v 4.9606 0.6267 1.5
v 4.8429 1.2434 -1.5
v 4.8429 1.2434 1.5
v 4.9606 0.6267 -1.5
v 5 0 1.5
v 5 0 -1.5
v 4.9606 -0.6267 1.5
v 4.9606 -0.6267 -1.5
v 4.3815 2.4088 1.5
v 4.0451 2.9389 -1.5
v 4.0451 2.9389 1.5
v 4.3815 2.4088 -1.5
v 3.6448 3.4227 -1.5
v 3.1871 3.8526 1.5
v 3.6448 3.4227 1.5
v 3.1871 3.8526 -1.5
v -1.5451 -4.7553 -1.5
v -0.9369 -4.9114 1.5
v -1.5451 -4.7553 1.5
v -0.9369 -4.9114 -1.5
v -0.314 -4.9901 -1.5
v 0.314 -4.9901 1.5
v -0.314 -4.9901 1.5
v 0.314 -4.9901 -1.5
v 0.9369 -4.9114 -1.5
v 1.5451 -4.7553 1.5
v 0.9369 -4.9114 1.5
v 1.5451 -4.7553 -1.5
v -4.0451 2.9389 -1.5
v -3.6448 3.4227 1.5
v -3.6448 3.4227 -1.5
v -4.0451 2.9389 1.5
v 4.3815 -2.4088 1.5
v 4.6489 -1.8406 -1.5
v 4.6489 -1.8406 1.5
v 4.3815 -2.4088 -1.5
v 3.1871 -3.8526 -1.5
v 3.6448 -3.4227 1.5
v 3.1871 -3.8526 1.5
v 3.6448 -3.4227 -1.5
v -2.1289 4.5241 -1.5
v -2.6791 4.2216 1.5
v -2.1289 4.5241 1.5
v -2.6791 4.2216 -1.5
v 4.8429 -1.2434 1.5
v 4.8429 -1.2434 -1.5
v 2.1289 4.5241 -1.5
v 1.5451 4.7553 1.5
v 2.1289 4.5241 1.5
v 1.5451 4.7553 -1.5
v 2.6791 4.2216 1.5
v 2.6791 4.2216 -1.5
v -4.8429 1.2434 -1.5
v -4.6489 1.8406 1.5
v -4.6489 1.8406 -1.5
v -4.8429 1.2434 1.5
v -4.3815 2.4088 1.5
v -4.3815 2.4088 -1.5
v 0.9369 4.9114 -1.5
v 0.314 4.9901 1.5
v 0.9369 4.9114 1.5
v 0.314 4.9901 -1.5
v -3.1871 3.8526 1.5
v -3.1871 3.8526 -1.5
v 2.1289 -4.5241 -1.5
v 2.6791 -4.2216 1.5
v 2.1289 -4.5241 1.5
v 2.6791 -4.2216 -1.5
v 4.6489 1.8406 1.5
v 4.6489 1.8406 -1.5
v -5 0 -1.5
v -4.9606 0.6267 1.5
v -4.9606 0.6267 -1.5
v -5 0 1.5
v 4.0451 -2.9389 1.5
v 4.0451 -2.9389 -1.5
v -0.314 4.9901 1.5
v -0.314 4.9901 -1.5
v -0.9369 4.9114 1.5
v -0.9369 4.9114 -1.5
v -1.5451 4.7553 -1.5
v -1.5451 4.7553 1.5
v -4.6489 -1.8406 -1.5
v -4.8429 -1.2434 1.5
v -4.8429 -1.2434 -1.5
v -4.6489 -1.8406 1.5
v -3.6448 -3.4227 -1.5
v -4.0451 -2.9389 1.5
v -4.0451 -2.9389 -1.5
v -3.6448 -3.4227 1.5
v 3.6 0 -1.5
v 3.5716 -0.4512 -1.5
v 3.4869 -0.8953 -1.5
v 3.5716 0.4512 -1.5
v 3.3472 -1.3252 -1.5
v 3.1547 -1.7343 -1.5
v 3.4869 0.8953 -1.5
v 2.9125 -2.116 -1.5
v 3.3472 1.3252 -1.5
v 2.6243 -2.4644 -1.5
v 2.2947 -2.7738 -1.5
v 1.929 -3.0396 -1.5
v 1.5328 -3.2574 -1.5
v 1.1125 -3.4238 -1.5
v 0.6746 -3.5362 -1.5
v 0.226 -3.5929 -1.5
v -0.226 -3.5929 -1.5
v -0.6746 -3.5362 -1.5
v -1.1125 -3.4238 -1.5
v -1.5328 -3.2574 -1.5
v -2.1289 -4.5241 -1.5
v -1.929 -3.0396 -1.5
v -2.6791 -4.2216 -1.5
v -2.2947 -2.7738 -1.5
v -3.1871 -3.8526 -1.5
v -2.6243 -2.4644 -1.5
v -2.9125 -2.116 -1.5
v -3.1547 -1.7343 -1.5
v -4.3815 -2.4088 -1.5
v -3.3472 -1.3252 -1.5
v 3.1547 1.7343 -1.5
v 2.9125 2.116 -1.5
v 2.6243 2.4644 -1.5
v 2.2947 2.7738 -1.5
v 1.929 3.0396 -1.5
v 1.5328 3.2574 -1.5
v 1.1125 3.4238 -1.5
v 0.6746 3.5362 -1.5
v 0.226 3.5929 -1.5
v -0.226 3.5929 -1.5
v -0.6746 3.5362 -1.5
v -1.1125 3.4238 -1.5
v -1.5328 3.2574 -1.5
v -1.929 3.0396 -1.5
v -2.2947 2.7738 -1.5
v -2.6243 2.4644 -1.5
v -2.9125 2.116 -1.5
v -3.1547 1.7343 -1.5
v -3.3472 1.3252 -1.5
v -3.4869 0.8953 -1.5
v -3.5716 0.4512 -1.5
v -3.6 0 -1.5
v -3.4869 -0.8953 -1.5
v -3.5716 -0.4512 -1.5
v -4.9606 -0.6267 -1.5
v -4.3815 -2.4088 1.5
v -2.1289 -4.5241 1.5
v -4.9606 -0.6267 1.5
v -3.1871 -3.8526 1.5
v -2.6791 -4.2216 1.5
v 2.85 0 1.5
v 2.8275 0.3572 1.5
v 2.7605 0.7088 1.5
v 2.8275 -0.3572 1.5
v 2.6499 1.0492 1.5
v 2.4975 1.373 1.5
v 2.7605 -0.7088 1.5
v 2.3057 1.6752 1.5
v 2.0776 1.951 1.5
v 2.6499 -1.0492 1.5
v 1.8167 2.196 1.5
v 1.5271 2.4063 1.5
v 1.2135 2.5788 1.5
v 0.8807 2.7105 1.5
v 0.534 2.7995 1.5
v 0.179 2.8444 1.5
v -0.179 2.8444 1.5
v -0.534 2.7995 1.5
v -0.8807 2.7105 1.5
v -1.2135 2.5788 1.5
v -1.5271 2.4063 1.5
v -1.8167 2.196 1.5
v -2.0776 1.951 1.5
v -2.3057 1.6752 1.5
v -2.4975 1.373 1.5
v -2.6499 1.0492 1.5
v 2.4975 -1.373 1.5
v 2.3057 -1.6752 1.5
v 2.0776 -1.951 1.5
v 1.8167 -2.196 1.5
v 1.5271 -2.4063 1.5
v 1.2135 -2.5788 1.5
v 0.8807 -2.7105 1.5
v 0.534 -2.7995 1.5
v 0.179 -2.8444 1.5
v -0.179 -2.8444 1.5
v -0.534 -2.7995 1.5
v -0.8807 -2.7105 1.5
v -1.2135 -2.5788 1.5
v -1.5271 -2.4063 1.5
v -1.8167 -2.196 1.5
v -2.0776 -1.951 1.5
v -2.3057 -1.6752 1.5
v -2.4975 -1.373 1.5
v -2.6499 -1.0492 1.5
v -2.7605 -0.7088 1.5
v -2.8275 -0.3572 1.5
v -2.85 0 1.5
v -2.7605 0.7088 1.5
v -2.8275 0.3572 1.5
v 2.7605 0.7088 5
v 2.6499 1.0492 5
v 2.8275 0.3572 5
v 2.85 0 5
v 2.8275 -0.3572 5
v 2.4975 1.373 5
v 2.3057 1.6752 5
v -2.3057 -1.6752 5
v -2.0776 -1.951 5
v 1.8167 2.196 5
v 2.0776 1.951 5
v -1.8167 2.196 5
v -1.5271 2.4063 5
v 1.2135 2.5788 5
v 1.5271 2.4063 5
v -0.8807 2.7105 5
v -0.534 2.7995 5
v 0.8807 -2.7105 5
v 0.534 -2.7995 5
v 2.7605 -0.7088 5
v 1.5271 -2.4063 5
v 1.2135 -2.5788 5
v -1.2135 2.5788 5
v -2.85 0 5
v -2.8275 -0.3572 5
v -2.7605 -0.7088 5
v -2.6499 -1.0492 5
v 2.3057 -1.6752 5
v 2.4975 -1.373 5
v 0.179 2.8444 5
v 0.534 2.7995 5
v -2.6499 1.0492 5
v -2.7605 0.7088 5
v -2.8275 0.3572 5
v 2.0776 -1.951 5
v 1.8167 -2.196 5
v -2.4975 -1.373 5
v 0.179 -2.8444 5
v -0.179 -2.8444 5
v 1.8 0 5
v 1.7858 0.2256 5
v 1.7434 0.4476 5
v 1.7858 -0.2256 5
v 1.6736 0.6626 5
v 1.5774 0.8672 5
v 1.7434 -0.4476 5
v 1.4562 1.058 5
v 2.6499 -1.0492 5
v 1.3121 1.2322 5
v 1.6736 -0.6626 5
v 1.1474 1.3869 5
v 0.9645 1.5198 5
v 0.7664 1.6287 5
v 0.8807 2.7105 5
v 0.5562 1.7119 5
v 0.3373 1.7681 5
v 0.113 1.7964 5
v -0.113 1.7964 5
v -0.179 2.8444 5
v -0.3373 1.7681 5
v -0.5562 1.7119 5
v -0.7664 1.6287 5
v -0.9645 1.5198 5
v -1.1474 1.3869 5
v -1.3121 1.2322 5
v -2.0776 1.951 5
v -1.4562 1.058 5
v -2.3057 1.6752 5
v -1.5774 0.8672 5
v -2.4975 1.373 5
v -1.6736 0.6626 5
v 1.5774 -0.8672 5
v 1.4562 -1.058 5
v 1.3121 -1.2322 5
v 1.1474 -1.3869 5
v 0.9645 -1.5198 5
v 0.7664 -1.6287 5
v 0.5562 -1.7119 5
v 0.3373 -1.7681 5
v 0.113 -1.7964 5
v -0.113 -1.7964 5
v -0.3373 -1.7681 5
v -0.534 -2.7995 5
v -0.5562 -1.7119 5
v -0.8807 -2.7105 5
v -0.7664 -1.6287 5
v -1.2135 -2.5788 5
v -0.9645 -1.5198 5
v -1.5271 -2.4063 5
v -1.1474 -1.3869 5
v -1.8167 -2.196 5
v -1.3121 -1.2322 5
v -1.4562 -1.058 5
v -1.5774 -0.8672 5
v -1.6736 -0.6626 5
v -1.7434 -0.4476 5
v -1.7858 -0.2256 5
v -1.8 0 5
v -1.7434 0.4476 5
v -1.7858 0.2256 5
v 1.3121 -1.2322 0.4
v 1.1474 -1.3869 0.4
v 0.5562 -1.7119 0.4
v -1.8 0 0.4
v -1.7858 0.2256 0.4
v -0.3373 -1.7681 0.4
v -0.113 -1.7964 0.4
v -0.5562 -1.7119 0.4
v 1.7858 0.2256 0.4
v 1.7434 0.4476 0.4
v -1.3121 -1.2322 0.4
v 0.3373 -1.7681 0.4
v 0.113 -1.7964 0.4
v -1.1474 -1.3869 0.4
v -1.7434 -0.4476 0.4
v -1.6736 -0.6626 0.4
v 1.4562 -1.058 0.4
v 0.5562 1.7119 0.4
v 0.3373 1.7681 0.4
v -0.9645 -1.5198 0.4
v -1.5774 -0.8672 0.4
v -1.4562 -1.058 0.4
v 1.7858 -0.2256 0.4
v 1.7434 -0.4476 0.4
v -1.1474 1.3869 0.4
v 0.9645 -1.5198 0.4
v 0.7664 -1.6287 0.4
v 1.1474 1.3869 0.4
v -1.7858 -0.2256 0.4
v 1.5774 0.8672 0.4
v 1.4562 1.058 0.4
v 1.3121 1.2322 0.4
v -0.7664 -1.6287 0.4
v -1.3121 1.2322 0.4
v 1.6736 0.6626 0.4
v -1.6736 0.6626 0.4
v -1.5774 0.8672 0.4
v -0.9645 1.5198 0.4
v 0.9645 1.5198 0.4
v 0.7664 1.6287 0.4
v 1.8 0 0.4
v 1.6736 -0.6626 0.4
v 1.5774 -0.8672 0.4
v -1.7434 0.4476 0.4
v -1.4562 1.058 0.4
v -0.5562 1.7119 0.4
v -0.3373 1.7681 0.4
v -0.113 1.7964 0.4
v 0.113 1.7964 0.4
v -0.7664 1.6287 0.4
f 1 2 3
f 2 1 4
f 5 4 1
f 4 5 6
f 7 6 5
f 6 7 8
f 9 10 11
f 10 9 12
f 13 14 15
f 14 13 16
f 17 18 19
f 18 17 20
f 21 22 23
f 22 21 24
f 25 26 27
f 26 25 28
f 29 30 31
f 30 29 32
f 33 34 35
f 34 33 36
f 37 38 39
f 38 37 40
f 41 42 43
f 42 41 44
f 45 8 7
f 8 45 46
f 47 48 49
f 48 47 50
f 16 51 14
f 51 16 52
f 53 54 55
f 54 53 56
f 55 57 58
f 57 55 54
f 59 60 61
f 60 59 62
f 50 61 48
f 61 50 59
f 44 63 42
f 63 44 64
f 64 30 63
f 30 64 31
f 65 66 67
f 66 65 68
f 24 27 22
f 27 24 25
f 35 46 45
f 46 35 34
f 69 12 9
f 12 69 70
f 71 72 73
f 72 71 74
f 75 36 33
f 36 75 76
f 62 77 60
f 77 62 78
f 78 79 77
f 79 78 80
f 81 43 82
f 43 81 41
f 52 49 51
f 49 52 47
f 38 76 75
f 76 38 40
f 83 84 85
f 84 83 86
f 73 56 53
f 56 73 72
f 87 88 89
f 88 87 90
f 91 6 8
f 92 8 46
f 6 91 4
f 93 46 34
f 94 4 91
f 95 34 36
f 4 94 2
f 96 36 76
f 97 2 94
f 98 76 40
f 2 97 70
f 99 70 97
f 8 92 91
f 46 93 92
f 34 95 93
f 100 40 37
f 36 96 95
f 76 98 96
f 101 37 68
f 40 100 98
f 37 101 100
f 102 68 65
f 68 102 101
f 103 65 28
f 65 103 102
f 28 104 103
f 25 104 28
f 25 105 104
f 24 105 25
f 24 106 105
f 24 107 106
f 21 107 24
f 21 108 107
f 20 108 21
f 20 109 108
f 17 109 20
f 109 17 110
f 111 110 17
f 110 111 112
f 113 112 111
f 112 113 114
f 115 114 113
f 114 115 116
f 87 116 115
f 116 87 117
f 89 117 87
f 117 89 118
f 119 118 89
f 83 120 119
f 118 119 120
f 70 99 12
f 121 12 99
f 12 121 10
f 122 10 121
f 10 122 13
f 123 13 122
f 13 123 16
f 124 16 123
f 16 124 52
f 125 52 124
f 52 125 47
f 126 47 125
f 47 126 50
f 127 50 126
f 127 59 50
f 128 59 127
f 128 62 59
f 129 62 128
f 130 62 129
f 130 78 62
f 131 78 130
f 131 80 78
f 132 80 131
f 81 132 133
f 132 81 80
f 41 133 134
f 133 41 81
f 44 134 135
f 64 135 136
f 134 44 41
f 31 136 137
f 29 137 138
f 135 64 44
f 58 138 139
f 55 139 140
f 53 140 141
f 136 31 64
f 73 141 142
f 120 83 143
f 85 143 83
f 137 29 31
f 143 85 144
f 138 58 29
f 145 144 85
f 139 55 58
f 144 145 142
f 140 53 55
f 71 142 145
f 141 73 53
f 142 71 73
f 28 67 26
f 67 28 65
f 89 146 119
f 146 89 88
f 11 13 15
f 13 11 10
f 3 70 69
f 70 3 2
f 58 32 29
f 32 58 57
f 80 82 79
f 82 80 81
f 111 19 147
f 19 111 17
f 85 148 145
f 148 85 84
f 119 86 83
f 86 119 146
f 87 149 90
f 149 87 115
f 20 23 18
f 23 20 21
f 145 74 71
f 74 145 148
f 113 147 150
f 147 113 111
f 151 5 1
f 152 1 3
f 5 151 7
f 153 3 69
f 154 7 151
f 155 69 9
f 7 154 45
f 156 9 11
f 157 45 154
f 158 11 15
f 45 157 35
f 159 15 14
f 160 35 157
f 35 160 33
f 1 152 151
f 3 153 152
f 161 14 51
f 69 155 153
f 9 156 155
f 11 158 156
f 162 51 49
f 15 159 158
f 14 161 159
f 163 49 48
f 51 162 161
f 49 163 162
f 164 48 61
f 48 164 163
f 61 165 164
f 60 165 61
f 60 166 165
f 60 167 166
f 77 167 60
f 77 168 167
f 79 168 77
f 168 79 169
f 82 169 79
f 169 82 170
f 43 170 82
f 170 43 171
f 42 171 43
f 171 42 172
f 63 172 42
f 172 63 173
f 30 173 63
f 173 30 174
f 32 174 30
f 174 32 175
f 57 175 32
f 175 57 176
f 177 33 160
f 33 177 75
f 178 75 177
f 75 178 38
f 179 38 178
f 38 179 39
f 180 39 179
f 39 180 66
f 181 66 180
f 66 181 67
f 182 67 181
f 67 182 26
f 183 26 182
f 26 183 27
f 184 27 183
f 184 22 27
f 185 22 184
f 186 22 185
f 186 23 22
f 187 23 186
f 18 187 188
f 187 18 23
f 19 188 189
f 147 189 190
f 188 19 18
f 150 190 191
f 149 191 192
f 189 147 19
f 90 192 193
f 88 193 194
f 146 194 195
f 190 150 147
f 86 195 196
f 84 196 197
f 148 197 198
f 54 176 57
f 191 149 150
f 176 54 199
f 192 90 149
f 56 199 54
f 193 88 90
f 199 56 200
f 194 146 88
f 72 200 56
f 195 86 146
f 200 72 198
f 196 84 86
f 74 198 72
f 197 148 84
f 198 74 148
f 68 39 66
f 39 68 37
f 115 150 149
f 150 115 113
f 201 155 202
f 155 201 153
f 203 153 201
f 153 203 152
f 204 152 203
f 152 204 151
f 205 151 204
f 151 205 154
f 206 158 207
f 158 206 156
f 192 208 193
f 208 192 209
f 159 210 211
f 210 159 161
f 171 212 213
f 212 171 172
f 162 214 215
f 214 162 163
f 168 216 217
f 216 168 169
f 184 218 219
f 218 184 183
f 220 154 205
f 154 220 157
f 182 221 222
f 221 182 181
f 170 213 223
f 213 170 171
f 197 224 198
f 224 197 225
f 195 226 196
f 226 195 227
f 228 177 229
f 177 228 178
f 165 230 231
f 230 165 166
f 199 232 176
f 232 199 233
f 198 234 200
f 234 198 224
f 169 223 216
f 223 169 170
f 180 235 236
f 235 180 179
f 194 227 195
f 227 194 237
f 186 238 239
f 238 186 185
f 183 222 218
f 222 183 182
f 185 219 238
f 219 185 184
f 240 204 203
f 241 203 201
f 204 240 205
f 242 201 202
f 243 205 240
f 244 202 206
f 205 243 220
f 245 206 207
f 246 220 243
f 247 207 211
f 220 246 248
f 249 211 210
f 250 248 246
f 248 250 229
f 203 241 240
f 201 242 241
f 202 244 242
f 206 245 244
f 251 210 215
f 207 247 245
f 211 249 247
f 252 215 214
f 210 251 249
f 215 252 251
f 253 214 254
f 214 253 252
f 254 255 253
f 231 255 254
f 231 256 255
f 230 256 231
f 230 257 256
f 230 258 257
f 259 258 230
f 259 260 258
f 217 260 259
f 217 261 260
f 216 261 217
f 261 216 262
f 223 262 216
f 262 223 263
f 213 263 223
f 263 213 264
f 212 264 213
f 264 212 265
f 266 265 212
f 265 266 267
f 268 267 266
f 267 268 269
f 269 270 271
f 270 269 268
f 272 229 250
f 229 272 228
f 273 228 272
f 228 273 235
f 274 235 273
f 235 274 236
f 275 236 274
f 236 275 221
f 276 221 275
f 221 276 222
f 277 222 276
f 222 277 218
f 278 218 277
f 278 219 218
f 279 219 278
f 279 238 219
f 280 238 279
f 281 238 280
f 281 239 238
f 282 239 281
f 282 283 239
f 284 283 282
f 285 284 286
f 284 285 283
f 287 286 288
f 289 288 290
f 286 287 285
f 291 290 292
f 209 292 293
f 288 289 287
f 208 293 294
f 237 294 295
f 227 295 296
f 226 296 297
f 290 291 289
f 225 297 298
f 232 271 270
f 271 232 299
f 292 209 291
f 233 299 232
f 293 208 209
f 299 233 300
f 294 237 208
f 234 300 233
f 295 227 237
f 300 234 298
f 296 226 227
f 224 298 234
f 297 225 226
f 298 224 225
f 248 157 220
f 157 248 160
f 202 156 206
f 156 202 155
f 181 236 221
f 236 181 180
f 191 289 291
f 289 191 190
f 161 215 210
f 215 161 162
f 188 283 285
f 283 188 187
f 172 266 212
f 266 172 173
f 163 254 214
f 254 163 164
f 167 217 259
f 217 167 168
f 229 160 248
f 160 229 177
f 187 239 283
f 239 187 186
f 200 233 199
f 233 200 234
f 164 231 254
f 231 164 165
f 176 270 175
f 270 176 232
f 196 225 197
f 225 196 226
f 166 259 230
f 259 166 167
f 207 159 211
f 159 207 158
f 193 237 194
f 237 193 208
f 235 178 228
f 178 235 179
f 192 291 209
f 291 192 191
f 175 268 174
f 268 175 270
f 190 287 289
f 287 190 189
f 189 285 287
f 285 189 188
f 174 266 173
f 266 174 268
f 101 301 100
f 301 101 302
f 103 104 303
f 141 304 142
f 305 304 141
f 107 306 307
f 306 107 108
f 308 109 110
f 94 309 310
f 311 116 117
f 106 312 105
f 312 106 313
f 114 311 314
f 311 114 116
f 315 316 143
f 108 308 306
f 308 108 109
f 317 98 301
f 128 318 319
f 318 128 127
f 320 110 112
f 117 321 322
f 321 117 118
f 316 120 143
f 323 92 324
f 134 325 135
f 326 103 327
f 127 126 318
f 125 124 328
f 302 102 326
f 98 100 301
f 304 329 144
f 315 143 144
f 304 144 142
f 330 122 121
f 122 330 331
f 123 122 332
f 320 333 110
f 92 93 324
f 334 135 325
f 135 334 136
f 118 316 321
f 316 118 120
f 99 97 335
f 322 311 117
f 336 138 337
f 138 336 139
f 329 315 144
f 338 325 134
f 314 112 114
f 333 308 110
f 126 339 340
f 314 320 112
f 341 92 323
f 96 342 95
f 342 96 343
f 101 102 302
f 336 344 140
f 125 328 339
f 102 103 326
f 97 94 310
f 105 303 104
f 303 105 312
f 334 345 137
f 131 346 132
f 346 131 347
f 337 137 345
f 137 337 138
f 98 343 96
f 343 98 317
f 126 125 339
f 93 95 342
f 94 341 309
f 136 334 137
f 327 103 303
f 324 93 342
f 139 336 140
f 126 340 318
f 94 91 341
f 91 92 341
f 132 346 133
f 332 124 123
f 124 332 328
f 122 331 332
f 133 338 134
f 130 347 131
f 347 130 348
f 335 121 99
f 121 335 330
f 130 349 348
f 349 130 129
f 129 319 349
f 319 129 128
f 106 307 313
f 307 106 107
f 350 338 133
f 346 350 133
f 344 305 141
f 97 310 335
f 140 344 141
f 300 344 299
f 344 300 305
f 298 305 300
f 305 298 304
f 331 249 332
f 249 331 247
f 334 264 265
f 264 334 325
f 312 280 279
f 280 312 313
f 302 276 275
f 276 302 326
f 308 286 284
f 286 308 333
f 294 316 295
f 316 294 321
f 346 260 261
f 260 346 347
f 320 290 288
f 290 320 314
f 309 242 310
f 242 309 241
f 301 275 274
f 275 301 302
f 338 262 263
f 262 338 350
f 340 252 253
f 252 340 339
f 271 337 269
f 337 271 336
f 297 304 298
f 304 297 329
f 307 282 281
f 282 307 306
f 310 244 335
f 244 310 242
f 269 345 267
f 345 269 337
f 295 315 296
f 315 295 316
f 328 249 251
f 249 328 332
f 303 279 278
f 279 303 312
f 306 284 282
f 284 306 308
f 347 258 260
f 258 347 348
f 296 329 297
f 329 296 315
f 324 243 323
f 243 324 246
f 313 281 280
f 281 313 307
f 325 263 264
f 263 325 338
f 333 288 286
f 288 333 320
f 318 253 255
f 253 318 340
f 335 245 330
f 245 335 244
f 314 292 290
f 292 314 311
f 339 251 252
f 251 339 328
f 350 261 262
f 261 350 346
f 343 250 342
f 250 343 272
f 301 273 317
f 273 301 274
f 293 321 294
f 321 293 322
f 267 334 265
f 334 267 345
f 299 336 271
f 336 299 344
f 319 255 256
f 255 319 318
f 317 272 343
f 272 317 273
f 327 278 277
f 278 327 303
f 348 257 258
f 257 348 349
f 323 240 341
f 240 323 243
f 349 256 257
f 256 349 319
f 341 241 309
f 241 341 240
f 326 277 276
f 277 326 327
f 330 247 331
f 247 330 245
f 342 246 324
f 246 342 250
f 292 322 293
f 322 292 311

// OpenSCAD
$fn = 50;


difference() {
	union() {
		translate(v = [0, 0, -1.5000000000]) {
			cylinder(h = 3, r = 5.0000000000);
		}
		translate(v = [0, 0, -1.5000000000]) {
			cylinder(h = 6.5000000000, r = 2.8500000000);
		}
	}
	union() {
		translate(v = [0, 0, -1.5000000000]) {
			rotate(a = [0, 180, 0]) {
				difference() {
					union() {
						translate(v = [0, 0, -6.5000000000]) {
							cylinder(h = 6.5000000000, r = 1.5000000000);
						}
						translate(v = [0, 0, -1.9000000000]) {
							cylinder(h = 1.9000000000, r1 = 1.8000000000, r2 = 3.6000000000);
						}
						translate(v = [0, 0, -6.5000000000]) {
							cylinder(h = 6.5000000000, r = 1.8000000000);
						}
						translate(v = [0, 0, -6.5000000000]) {
							cylinder(h = 6.5000000000, r = 1.5000000000);
						}
					}
					union();
				}
			}
		}
		translate(v = [0, 0, -100.0000000000]) {
			cylinder(h = 200, r = 1.8000000000);
		}
	}
}
